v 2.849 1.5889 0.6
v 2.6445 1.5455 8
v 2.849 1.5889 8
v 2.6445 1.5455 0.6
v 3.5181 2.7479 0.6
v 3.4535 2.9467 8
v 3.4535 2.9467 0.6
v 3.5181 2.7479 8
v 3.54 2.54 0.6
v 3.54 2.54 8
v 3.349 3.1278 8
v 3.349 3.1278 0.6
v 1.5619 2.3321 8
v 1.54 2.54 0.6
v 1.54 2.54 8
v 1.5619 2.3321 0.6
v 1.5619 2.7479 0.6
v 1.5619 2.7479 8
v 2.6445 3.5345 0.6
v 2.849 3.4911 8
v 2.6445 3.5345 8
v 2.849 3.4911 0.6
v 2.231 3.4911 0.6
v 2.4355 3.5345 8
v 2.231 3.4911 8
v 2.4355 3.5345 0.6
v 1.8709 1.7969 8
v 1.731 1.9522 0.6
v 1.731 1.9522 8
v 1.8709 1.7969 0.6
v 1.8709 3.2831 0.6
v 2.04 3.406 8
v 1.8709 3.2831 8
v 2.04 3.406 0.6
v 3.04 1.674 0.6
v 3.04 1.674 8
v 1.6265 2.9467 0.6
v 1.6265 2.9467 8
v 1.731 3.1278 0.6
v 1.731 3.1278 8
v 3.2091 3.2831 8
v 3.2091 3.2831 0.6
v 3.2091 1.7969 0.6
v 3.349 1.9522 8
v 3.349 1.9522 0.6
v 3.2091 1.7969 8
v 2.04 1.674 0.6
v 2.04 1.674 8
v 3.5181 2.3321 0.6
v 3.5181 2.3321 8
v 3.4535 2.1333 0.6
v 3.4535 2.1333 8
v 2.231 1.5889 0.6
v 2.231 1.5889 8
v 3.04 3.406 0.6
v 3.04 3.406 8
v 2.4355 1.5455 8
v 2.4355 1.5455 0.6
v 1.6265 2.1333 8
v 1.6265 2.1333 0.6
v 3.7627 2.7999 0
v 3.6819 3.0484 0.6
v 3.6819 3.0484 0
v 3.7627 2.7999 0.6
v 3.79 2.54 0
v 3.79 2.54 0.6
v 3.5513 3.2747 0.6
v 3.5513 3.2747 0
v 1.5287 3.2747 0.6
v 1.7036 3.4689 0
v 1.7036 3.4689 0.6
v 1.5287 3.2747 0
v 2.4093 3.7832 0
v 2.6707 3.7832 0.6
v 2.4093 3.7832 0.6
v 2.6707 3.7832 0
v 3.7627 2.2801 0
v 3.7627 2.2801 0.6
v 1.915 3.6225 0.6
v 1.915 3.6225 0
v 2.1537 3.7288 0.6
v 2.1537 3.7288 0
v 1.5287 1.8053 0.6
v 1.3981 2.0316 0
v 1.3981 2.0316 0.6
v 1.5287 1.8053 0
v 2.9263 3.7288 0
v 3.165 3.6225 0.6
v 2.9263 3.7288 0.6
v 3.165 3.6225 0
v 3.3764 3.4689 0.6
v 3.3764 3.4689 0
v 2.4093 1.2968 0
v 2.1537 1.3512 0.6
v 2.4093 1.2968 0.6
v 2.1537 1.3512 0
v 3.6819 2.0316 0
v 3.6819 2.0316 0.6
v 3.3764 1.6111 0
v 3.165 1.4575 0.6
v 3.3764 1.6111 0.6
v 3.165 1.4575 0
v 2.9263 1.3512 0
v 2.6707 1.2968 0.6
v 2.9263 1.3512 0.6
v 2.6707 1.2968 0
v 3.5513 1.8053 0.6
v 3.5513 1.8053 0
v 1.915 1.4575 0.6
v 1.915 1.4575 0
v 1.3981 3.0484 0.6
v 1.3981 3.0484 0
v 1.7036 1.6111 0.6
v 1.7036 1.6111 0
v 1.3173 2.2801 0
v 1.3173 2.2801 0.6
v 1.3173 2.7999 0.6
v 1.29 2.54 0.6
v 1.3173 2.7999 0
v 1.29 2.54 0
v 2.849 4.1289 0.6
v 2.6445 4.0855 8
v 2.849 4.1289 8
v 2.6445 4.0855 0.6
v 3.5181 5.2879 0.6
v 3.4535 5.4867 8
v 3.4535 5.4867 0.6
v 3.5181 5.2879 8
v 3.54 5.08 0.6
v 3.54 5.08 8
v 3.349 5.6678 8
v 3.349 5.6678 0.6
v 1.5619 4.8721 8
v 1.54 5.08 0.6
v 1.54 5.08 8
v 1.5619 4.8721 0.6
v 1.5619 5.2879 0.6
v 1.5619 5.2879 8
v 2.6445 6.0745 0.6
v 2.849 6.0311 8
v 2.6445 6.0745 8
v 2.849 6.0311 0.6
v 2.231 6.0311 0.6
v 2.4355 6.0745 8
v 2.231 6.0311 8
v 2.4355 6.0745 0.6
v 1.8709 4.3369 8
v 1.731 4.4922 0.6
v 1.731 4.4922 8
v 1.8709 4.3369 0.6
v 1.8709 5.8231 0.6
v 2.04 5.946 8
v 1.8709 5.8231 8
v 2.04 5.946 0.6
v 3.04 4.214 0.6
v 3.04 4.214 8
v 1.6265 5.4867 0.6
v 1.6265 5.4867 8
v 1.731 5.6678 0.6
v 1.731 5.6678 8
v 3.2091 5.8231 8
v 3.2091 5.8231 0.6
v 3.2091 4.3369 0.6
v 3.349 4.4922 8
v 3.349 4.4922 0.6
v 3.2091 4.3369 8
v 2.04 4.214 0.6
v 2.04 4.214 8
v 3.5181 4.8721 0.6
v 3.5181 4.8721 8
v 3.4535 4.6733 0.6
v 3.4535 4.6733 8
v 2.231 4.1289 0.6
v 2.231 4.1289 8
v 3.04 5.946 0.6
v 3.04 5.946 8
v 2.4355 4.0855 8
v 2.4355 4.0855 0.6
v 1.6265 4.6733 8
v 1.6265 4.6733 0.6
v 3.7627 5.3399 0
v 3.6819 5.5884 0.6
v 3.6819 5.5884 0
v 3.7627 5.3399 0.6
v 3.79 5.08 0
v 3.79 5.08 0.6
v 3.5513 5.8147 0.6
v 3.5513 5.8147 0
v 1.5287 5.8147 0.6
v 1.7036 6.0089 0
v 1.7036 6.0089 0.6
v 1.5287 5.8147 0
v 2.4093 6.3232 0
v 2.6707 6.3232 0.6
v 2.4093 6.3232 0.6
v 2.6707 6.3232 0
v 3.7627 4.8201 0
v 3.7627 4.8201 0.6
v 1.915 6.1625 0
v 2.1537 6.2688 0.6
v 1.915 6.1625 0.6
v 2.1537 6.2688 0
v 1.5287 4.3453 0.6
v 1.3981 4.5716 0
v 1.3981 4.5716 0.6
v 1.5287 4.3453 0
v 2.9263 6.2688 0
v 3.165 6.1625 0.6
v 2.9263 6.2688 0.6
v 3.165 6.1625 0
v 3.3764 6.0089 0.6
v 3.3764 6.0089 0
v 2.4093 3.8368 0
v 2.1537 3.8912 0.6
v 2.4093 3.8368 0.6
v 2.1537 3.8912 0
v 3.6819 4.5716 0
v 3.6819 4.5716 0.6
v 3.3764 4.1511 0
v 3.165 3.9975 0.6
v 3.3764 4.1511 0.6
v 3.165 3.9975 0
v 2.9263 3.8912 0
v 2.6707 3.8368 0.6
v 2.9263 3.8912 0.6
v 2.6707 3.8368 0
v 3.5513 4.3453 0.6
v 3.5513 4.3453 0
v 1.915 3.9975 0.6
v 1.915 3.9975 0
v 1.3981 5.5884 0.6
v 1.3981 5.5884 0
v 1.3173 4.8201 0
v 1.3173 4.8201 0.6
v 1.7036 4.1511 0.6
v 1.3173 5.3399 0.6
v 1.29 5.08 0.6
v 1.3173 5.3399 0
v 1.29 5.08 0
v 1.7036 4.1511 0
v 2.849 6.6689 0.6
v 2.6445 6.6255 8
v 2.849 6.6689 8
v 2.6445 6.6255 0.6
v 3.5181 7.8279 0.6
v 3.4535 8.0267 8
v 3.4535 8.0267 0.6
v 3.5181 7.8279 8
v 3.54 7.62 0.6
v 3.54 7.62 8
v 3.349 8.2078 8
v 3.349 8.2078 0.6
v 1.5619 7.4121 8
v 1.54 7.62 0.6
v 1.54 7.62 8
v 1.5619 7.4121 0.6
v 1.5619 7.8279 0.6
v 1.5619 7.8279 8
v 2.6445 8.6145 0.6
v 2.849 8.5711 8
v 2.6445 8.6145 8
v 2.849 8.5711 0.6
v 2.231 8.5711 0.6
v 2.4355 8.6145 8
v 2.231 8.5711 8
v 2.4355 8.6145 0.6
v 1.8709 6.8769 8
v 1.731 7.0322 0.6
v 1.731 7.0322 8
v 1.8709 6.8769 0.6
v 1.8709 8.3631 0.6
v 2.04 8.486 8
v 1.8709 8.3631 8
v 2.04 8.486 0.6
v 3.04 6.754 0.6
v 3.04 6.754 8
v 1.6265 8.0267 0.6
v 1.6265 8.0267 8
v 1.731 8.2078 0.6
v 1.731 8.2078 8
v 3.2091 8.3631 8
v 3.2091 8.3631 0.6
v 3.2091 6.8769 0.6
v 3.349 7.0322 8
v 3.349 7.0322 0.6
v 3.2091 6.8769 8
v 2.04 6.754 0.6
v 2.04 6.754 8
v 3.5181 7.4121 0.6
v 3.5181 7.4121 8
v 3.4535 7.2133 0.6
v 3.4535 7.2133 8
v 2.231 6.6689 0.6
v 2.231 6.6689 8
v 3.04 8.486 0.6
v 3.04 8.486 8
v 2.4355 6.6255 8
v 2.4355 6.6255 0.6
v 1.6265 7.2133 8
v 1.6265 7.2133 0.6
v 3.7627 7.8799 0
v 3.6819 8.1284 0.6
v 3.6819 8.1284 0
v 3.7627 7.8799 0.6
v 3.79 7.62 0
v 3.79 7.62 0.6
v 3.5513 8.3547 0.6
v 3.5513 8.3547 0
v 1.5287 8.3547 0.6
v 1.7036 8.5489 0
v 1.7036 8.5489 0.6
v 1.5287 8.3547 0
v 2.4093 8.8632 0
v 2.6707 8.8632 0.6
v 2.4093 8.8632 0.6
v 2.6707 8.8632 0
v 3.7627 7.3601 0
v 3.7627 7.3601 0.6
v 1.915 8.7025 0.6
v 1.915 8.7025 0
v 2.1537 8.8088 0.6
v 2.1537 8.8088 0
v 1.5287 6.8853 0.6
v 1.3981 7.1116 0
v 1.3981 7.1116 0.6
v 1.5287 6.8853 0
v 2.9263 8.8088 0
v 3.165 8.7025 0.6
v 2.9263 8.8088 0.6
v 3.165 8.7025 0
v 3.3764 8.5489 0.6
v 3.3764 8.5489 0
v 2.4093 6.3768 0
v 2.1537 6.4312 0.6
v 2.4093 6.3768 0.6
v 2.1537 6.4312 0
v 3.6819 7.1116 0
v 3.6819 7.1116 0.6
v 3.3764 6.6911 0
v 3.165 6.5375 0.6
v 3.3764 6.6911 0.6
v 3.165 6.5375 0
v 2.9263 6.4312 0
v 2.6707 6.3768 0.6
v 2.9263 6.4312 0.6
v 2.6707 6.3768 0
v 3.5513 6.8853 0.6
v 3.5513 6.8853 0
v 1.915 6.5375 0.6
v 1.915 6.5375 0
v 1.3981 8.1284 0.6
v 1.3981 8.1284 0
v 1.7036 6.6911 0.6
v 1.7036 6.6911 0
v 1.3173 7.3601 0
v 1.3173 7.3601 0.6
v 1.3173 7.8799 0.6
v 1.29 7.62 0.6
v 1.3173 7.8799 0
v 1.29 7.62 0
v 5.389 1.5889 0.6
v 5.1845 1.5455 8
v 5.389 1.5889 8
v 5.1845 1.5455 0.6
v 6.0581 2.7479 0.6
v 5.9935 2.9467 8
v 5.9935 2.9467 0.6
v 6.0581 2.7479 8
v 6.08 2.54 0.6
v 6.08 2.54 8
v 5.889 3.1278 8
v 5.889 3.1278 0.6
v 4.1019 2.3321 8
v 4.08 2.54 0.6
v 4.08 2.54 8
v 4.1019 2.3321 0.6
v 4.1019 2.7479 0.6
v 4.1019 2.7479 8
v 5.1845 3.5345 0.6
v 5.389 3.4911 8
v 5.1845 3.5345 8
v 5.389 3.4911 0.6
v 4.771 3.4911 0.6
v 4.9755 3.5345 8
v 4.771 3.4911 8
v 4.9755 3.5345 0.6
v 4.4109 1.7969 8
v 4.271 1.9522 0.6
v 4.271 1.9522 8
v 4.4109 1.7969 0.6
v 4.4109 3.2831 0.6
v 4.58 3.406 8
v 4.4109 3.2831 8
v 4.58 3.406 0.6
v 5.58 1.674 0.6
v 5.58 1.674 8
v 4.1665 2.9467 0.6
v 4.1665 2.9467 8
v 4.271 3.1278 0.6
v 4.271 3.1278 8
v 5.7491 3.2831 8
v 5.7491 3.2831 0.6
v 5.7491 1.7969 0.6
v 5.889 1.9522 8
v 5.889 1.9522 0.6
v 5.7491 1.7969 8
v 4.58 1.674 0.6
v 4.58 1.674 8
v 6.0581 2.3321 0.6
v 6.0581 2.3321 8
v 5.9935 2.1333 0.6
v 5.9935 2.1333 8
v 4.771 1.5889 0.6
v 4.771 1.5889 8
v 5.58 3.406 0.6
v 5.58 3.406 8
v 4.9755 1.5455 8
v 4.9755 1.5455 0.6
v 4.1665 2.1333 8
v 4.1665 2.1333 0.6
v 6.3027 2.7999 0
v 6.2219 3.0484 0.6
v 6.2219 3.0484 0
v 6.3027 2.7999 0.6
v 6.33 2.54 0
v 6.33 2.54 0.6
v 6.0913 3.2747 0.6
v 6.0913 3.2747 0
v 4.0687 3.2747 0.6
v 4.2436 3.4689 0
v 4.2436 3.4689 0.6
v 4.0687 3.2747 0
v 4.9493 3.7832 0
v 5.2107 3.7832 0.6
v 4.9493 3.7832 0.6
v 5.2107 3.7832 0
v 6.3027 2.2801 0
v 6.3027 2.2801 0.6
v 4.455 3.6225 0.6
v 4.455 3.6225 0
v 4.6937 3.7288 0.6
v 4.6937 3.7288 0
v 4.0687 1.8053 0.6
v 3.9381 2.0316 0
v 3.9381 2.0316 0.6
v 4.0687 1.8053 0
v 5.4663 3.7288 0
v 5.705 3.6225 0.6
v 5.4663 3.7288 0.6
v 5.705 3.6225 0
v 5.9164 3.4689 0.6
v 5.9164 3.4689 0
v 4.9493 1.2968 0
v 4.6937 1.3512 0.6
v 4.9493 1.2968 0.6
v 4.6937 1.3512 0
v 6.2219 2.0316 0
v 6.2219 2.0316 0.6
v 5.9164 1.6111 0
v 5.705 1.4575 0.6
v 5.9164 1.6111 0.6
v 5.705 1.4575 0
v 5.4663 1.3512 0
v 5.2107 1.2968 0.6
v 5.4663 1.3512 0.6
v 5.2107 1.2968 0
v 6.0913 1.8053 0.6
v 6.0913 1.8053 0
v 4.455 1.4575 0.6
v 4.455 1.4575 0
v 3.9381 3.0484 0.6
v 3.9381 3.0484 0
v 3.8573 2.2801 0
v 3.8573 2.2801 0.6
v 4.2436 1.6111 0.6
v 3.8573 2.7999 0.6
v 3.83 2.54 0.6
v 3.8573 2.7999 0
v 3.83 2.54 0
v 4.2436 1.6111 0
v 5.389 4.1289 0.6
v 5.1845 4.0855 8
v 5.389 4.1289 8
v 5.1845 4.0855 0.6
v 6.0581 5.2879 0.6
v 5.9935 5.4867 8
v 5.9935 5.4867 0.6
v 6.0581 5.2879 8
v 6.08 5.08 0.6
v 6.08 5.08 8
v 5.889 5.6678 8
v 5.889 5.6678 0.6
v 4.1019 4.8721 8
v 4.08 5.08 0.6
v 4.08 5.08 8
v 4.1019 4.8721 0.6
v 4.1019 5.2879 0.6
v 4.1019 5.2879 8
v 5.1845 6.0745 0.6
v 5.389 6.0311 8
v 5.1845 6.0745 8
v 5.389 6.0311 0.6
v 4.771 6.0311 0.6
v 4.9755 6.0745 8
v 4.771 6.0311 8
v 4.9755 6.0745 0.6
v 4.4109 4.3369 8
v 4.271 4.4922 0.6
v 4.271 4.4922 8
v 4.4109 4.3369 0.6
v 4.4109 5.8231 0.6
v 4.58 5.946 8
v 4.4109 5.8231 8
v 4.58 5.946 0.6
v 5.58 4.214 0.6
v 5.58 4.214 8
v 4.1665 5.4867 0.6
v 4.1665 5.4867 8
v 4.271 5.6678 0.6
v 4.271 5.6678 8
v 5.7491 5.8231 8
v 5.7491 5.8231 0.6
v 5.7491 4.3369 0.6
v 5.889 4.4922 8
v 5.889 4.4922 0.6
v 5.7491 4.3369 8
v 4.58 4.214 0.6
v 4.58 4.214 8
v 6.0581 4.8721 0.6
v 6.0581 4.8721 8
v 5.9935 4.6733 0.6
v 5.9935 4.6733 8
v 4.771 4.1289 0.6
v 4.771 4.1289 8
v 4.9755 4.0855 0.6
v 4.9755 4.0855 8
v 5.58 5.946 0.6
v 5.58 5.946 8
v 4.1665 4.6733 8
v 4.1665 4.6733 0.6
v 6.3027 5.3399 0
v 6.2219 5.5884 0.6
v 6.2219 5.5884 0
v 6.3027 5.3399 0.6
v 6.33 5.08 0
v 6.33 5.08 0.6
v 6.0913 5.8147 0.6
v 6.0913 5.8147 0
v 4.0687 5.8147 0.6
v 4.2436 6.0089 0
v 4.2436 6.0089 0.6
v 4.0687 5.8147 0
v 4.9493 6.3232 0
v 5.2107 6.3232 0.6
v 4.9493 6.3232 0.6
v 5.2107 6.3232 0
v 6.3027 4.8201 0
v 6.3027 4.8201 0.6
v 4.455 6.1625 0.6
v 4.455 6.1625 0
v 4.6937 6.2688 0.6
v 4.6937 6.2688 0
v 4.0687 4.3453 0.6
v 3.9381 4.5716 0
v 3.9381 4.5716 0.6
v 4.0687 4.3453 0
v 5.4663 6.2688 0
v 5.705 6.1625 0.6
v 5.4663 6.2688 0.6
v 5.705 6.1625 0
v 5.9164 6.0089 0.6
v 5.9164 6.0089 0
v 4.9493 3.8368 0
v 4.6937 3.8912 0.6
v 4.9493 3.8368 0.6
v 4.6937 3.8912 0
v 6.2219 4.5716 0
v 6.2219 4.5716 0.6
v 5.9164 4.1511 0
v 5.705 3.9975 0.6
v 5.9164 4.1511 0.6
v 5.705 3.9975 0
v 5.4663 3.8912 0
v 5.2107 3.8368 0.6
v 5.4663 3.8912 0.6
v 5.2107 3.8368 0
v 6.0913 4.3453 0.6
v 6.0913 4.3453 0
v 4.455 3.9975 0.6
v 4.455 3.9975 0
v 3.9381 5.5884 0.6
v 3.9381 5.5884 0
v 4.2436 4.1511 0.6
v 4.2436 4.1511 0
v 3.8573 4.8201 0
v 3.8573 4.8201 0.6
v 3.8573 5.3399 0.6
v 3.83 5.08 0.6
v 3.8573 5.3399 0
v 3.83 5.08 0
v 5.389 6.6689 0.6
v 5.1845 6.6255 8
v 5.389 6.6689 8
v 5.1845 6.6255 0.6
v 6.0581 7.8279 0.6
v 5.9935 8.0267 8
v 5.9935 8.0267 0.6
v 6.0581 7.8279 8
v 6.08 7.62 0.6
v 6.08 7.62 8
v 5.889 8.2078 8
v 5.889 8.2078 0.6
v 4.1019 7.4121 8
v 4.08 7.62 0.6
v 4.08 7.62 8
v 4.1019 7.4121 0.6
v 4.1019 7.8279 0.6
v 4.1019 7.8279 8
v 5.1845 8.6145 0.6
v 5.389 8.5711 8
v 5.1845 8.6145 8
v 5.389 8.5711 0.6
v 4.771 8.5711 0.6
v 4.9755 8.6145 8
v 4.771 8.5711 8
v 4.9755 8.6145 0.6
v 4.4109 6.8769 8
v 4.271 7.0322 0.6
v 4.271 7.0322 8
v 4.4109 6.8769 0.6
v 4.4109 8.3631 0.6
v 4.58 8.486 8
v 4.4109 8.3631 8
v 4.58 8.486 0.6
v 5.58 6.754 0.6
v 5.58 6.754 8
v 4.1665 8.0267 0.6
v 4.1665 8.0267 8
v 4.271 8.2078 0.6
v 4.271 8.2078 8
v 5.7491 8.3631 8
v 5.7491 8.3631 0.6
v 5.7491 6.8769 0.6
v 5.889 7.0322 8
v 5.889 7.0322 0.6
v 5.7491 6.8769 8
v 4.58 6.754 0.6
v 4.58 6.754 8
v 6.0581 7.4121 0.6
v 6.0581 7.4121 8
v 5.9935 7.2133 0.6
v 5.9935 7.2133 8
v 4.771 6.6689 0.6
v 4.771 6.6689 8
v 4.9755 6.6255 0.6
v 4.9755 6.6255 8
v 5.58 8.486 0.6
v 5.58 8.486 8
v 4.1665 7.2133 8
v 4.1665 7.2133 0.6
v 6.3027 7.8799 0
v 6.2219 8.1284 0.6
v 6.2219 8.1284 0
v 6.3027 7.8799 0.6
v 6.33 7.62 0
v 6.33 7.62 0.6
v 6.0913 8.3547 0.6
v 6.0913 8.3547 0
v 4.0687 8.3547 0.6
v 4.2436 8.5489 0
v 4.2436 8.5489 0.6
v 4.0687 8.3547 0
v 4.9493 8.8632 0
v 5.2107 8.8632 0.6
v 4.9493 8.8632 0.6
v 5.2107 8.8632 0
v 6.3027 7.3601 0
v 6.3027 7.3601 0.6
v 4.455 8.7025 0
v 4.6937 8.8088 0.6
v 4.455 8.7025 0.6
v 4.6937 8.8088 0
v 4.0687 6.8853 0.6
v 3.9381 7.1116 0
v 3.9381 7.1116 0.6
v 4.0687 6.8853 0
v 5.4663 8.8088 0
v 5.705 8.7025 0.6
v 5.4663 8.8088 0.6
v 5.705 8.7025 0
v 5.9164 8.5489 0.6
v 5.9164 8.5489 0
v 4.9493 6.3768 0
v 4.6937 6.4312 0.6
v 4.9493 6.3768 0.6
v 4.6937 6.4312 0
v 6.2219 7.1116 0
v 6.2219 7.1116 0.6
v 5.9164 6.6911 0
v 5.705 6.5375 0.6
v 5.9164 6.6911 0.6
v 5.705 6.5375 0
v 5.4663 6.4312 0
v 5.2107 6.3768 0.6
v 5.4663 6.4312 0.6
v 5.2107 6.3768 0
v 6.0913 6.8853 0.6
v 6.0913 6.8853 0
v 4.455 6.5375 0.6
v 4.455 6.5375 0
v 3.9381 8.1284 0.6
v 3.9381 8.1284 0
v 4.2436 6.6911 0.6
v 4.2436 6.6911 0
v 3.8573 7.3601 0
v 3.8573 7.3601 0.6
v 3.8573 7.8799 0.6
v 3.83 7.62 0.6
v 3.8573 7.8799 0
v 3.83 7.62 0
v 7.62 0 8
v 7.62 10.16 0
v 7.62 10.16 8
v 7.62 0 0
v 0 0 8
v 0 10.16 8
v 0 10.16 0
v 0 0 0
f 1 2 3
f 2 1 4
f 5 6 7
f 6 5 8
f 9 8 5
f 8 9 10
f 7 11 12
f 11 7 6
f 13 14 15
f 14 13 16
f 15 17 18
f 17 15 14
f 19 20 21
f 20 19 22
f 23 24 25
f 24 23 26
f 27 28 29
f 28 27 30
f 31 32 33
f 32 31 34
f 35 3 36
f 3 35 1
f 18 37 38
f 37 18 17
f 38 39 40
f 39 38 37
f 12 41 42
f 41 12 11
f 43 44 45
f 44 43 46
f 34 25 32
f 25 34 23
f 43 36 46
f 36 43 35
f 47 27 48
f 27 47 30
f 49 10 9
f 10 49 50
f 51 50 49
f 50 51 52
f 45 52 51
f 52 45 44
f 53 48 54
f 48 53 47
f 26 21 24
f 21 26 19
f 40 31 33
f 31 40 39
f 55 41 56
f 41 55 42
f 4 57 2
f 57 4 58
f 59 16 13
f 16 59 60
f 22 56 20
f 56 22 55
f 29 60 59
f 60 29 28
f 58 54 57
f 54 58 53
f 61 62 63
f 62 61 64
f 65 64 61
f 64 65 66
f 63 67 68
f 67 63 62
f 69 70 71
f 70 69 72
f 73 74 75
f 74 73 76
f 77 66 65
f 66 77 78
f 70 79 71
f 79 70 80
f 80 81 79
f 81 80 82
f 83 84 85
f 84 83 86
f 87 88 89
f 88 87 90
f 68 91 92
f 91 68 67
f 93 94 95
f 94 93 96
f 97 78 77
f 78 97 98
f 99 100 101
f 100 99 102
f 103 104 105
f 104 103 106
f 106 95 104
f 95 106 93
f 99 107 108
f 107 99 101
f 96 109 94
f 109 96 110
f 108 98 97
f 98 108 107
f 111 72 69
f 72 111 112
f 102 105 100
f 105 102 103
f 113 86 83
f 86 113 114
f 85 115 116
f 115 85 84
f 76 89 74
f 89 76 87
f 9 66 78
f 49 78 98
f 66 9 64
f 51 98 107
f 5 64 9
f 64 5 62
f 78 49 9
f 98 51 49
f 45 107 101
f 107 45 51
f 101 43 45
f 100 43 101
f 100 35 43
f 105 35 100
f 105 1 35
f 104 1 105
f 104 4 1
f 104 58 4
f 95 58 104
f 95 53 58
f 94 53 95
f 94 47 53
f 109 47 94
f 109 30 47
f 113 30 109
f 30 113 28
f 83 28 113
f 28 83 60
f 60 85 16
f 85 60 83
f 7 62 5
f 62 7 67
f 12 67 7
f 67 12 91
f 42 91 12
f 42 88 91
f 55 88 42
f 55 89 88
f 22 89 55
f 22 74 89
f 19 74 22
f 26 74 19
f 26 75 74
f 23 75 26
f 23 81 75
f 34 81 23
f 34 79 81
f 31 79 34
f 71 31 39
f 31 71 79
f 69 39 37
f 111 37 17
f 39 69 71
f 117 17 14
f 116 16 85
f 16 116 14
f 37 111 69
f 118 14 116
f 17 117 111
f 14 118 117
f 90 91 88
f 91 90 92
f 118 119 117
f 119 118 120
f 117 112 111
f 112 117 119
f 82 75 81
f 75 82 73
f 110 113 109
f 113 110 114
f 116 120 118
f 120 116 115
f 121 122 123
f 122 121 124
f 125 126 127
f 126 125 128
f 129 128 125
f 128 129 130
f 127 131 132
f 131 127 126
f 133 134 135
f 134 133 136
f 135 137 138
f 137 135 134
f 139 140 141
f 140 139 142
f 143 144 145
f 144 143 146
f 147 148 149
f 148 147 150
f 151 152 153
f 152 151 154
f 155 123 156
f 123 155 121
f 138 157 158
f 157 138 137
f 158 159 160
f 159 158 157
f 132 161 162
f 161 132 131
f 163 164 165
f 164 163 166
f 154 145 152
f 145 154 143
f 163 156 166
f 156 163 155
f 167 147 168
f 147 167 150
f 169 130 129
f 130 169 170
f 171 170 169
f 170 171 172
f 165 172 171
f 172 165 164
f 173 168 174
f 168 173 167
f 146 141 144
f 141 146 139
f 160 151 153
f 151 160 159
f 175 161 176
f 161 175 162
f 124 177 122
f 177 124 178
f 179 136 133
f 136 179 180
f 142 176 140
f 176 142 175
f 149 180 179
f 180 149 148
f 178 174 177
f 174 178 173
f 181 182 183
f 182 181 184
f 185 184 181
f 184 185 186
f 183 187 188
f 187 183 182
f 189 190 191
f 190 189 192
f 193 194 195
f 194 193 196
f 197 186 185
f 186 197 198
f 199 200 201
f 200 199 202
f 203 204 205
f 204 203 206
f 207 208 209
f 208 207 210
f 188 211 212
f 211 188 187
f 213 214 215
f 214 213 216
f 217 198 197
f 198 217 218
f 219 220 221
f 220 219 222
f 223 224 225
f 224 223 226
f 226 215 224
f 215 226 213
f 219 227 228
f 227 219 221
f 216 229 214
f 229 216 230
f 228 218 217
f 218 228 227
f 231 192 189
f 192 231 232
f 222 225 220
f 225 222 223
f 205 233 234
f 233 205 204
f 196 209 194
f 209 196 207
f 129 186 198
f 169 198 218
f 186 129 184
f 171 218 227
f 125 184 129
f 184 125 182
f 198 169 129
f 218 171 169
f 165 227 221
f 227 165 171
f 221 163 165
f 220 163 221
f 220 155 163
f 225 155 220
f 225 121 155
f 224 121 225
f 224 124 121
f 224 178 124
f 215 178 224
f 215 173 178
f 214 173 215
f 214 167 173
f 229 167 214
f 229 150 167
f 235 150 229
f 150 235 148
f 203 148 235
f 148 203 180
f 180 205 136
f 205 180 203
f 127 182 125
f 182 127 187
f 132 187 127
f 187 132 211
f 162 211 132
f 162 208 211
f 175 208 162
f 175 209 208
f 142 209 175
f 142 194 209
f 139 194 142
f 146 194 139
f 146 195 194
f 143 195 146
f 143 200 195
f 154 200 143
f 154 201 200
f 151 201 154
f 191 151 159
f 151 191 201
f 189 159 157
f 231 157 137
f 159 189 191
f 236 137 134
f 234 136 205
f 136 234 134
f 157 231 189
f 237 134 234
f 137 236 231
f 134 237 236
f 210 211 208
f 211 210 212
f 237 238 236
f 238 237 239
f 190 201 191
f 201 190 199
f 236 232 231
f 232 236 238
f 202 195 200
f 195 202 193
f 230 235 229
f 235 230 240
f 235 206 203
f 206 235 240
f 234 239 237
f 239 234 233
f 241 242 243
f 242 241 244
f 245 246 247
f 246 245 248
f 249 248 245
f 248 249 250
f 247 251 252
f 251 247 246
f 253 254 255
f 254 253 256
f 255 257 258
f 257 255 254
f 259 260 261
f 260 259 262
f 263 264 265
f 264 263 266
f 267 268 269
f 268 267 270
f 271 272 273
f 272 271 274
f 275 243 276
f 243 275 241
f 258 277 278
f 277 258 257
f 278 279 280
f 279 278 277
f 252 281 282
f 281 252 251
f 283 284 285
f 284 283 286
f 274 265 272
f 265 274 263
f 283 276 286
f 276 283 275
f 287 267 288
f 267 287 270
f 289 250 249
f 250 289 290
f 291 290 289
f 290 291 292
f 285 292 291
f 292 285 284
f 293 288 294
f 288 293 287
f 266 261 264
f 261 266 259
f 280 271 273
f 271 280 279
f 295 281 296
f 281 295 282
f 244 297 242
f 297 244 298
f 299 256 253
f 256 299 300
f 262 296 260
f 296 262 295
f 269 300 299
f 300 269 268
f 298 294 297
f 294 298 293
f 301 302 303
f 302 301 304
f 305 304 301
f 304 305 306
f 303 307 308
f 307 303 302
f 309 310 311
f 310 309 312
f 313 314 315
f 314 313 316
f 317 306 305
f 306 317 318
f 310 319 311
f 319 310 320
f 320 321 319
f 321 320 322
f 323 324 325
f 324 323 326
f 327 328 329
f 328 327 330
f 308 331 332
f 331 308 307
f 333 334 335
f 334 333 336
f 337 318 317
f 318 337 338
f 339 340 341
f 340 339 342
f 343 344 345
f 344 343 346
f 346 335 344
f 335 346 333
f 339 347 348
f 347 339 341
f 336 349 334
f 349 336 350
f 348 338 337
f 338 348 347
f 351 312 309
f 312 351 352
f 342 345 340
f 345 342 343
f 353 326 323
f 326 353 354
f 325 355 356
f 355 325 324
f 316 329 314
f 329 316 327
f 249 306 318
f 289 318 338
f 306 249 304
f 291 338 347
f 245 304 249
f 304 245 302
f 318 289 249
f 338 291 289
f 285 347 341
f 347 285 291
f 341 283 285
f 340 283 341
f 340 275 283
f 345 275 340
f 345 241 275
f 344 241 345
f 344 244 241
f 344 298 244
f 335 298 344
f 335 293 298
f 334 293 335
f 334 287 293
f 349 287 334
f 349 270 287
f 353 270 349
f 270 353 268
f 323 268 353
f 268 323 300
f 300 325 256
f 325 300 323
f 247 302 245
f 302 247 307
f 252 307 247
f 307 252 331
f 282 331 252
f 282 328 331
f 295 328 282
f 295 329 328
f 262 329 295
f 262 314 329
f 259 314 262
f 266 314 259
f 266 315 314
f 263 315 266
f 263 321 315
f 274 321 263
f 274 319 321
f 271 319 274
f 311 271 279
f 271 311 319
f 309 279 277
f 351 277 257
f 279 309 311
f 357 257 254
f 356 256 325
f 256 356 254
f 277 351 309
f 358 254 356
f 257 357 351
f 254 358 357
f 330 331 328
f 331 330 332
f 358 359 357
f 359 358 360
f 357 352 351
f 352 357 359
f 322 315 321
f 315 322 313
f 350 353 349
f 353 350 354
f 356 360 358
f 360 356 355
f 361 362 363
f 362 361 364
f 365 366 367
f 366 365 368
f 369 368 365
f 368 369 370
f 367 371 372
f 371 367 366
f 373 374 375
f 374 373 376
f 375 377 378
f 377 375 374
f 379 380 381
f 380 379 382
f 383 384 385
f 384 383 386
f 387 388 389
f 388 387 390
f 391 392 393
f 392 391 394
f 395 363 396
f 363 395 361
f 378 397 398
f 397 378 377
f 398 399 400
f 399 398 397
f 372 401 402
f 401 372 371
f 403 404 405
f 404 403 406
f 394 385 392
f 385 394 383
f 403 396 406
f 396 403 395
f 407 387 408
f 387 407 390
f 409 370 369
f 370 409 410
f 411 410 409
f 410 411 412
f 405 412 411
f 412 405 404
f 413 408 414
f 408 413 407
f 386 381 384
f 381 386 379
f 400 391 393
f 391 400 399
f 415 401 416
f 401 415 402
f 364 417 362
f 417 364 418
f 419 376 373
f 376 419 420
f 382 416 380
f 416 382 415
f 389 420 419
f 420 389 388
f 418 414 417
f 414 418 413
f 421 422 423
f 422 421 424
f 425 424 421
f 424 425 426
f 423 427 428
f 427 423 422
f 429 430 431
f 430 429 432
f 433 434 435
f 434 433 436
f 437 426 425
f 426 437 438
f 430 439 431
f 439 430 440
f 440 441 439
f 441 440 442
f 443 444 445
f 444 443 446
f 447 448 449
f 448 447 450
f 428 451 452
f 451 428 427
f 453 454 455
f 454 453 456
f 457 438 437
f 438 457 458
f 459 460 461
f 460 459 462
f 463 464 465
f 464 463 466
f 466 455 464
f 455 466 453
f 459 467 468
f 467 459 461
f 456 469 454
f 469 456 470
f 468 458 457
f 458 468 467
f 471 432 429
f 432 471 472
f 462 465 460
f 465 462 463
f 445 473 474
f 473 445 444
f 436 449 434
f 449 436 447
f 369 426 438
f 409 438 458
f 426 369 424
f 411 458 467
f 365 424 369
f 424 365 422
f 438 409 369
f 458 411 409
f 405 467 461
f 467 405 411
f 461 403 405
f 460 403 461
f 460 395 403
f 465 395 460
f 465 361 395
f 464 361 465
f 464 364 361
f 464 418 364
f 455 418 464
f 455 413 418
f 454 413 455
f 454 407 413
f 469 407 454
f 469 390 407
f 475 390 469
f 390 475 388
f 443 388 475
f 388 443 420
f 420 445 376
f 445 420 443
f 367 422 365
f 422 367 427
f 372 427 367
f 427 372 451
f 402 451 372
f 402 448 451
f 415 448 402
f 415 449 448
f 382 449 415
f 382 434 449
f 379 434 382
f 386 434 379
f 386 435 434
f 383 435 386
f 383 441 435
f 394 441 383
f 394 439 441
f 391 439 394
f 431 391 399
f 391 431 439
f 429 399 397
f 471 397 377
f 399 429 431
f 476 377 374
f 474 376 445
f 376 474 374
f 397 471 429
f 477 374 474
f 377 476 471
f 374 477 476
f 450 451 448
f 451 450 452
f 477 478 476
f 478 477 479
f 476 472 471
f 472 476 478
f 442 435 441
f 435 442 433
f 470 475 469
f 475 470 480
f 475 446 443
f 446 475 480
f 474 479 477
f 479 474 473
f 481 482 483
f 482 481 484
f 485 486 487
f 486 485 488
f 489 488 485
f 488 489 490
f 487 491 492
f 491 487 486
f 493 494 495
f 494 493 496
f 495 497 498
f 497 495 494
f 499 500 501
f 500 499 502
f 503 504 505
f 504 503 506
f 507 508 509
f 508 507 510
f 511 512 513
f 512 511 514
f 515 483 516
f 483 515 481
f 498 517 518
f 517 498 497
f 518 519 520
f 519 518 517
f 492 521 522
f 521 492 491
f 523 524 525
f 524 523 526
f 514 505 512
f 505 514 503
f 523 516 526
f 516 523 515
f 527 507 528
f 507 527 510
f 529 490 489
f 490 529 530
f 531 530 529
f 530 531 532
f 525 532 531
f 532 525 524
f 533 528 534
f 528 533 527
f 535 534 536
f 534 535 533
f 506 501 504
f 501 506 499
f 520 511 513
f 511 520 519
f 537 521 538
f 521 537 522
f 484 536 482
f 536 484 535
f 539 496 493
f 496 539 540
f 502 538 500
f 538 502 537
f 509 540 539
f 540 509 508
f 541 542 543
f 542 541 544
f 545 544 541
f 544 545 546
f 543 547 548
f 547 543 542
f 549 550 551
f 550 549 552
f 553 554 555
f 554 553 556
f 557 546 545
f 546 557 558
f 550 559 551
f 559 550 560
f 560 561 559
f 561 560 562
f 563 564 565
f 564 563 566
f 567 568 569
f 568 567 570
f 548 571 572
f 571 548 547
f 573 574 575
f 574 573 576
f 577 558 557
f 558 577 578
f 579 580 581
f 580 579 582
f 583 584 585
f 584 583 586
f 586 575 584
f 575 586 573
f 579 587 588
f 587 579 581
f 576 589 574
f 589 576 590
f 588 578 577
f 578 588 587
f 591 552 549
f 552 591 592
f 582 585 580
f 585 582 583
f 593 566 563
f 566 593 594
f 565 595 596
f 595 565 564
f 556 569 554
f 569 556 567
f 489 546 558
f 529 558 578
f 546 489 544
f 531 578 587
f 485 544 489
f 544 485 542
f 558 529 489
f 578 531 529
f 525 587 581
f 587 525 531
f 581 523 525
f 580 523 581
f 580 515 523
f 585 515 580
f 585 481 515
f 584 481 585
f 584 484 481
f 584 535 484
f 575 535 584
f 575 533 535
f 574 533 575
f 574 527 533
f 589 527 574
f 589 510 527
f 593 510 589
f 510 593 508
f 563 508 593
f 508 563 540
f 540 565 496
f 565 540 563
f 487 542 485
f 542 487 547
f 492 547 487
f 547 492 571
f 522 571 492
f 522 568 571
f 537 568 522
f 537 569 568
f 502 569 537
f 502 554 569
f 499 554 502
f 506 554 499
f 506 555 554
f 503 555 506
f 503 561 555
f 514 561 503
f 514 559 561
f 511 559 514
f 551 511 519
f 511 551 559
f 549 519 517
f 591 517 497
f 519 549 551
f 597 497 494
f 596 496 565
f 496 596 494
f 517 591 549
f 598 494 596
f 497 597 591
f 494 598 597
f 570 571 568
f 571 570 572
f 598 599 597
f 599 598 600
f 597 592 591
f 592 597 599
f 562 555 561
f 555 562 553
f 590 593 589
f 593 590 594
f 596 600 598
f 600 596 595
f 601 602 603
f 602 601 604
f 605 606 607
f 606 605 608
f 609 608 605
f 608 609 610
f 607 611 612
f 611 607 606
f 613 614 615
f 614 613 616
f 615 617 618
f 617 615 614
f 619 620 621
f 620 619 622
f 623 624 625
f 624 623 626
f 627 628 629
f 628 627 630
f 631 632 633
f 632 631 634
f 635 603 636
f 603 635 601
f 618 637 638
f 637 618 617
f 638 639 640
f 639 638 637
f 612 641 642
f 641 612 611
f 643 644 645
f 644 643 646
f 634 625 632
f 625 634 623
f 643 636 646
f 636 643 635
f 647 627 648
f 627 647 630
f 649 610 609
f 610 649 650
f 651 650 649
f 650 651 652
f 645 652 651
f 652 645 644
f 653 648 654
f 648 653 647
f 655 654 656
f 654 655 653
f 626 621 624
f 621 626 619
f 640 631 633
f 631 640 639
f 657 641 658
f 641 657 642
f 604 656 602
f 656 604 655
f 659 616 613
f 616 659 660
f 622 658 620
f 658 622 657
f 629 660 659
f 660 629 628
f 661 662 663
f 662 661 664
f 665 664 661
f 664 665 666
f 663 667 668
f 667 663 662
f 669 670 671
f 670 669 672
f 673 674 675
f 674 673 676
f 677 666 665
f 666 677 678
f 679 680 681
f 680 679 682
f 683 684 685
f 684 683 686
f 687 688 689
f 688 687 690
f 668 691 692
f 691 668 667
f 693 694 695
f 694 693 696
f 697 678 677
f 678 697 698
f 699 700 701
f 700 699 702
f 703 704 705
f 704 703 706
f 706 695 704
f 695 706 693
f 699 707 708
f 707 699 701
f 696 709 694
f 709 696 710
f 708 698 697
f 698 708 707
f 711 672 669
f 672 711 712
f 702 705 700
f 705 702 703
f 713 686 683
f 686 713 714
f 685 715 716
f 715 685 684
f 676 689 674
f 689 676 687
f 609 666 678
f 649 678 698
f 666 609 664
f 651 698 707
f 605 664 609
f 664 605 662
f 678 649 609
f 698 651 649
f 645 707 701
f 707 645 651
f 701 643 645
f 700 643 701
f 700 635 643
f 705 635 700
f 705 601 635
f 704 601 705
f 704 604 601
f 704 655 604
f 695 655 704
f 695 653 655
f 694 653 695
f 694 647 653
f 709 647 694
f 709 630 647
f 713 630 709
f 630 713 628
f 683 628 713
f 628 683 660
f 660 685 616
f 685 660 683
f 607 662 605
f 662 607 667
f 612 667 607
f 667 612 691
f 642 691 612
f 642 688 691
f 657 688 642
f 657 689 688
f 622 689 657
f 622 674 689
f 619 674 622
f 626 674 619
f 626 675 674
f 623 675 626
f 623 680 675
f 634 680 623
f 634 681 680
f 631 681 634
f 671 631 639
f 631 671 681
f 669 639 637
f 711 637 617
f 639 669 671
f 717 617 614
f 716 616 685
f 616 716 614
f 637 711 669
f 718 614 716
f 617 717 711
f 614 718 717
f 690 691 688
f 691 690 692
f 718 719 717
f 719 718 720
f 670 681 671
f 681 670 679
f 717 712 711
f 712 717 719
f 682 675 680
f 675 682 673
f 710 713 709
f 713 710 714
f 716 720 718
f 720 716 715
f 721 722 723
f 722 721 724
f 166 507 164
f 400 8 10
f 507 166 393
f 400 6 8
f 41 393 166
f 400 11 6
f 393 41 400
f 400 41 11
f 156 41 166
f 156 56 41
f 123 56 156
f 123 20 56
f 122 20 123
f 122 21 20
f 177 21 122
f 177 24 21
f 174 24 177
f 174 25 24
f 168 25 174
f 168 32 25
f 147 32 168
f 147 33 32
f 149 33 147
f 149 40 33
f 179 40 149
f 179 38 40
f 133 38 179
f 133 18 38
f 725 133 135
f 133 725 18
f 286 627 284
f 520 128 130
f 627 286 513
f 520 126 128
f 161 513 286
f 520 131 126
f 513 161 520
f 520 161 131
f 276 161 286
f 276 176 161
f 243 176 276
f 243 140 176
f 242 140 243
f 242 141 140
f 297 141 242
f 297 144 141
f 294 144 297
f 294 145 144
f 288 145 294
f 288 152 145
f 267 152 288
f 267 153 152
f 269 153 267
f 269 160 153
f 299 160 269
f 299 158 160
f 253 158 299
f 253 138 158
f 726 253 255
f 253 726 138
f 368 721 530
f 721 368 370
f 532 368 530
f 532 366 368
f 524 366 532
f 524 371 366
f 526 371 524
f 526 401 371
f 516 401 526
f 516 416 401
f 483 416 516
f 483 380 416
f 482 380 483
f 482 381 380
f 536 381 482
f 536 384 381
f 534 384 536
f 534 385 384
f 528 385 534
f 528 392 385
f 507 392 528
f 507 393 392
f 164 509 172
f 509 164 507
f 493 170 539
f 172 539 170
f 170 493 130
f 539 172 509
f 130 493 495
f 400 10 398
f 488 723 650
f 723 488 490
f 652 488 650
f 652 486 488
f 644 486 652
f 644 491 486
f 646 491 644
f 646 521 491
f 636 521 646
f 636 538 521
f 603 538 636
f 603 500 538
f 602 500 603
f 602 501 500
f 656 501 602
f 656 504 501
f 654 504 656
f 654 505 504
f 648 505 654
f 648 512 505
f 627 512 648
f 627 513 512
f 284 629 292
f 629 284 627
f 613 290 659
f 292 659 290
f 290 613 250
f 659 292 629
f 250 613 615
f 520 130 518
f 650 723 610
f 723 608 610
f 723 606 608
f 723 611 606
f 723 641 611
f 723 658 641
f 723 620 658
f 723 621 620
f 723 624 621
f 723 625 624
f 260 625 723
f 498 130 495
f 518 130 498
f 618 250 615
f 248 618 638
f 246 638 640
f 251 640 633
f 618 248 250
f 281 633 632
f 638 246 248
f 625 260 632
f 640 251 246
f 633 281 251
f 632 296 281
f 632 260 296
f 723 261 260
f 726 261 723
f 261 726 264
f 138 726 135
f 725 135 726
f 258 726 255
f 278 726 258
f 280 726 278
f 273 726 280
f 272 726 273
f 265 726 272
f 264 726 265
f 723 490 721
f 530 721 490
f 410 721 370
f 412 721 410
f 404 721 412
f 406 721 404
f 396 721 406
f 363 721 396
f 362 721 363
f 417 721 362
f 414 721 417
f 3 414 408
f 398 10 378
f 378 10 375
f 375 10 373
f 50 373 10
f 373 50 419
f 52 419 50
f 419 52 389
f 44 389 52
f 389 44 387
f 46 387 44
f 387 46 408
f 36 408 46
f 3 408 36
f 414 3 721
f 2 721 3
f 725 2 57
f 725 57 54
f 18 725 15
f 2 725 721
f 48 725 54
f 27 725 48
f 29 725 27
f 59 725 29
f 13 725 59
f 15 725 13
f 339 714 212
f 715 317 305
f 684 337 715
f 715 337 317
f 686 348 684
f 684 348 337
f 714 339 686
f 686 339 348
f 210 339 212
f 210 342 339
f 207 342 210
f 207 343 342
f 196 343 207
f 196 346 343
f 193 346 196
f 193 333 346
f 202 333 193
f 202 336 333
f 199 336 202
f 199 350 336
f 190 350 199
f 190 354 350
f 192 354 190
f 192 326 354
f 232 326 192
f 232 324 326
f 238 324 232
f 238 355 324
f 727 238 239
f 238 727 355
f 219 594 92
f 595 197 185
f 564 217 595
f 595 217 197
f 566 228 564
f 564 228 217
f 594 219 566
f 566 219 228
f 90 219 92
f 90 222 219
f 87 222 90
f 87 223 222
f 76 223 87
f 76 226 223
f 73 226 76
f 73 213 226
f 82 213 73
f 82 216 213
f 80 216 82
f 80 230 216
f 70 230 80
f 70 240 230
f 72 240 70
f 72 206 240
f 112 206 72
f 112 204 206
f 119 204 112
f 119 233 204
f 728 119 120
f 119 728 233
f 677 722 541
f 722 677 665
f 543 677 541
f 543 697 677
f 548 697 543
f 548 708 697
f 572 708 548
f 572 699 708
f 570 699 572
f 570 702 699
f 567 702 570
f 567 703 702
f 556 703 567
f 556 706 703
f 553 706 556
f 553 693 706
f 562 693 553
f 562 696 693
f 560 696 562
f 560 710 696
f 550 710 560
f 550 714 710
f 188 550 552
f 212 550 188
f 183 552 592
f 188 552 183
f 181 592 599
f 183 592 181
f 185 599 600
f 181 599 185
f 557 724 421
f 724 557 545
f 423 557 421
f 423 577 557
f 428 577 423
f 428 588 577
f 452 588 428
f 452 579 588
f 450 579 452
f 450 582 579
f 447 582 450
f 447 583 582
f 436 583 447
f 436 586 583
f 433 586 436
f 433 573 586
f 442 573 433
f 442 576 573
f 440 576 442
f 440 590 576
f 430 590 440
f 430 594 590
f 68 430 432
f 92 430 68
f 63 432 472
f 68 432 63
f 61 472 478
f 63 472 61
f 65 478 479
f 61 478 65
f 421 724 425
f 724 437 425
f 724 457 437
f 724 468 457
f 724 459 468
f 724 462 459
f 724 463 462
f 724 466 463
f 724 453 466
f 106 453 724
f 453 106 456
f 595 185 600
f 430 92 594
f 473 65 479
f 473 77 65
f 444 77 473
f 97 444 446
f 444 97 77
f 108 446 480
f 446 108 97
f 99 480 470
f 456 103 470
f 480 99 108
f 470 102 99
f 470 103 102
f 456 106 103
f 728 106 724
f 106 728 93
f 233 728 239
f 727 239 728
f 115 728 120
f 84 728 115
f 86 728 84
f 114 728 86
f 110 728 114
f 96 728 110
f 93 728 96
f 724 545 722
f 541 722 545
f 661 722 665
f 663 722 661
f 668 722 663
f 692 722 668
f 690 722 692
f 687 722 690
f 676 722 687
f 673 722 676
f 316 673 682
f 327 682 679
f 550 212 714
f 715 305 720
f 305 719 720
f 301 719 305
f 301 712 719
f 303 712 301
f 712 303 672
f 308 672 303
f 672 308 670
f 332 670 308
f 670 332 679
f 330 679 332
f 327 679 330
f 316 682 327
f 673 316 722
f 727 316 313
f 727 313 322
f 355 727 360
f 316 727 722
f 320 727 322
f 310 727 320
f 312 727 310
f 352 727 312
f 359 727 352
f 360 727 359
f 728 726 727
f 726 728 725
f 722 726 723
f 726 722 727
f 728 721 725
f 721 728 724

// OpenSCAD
/* Löthilfe für Pogo Pins 
   Copyright, 2023, Mathias Moog, Hochschule Ansbach, Deutschland, CC-BY-NC-SA
*/

// Abmessung in Anzahl der Pins
nx=2;
ny=3;
// Höhe
h=8;
// Durchmesser der Löcher, nicht zu groß wählen
d=2;
// Durchmesser und Höhe der Montagescheibe der Pogo Pins
ds=2.5;
hs=0.6;
// Rastermaß
r=2.54;
// Schöne runde Löcher
$fn=30;

difference() {
  cube([nx*r+r,ny*r+r,h]);
  for(x=[1:nx]) {
    for(y=[1:ny]) {
      // Pin
      translate([x*r,y*r,-h]) cylinder(d=d,h=3*h);
      // Scheibe
      translate([x*r,y*r,-hs]) cylinder(d=ds,h=2*hs);
    }
  }
}
  
